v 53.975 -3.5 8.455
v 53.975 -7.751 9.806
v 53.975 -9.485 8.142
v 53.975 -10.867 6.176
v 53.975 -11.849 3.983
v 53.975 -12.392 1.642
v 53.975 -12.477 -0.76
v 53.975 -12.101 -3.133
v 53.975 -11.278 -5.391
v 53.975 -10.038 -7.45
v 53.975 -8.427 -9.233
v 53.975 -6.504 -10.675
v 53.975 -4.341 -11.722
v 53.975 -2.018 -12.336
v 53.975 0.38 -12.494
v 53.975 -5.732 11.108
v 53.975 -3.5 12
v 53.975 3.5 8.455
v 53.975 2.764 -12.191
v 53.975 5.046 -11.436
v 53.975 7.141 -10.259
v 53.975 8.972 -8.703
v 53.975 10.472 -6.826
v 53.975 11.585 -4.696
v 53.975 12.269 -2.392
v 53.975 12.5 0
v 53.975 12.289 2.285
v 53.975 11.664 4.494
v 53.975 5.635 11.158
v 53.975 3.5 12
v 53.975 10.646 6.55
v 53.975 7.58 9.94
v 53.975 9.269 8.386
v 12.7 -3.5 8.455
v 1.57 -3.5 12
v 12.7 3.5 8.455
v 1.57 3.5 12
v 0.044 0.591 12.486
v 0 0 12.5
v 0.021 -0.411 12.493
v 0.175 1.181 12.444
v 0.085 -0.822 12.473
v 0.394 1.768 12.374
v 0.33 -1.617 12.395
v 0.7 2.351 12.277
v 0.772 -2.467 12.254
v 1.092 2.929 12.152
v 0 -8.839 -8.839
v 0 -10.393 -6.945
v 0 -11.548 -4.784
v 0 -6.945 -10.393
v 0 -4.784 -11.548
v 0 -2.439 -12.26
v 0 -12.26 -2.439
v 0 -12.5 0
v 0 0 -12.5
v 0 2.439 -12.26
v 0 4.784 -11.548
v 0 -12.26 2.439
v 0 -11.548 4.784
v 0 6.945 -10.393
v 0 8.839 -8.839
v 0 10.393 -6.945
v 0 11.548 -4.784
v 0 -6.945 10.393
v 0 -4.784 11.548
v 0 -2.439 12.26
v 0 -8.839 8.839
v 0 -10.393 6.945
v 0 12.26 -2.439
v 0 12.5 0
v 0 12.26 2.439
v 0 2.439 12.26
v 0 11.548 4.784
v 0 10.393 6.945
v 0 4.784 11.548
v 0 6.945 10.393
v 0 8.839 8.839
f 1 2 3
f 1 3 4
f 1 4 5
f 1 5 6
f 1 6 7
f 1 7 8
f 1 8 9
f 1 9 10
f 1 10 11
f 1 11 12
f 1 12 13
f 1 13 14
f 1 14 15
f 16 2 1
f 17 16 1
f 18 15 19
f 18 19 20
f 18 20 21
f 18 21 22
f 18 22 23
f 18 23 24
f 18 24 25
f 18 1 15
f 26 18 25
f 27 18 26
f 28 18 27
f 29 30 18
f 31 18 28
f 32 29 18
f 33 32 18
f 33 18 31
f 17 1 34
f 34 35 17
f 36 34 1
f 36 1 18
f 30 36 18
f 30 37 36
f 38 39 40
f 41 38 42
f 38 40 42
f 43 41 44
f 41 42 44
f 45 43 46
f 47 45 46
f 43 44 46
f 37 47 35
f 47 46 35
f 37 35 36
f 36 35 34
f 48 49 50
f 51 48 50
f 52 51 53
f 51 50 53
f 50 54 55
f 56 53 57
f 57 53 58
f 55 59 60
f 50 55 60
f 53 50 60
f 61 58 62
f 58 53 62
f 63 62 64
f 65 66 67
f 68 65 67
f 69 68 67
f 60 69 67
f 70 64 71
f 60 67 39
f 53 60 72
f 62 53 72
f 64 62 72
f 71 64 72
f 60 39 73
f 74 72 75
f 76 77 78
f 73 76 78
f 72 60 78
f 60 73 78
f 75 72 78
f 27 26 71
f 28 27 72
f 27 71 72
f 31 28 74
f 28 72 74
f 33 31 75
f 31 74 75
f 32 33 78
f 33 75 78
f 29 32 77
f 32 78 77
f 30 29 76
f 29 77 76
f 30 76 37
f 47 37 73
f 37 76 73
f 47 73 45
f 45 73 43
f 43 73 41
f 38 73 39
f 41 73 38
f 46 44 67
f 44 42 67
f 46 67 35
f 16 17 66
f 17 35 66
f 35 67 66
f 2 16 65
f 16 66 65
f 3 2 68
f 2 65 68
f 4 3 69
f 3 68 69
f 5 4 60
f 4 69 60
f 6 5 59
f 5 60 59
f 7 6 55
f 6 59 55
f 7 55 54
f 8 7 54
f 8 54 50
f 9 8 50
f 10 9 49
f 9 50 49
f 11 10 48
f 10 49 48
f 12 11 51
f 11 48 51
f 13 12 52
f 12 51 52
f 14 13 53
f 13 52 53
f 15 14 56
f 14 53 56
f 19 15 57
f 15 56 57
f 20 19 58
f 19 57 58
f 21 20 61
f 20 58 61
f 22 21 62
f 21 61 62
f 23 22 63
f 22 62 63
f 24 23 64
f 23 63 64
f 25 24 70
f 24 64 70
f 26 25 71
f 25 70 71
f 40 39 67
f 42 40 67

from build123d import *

# Parameters (mm, degrees)
F0_R     = 12.5
F1_DEPTH = 53.975
F3_W     = 7
F3_H     = 4.045
F4_DEPTH = 41.276
F6_DEPTH = 3.5


with BuildPart() as f1:
    # F0 (on Right) → F1 (new body)
    with BuildSketch(Plane.YZ):
        Circle(F0_R)
    extrude(amount=F1_DEPTH)

    # F3 (on offset) → F4 (cut, through all)
    with BuildSketch(Plane.YZ.offset(12.7)):
        with Locations((0, 10.4775)):
            Rectangle(F3_W, F3_H)
    extrude(amount=F4_DEPTH, mode=Mode.SUBTRACT)

    # F5 (on Front) → F6 (cut, symmetric)
    with BuildSketch(Plane.XZ):
        Polygon((0, 12.5), (12.7, 8.455), (12.7, 12.5), align=None)
    extrude(amount=F6_DEPTH, both=True, mode=Mode.SUBTRACT)


solid = f1.part
